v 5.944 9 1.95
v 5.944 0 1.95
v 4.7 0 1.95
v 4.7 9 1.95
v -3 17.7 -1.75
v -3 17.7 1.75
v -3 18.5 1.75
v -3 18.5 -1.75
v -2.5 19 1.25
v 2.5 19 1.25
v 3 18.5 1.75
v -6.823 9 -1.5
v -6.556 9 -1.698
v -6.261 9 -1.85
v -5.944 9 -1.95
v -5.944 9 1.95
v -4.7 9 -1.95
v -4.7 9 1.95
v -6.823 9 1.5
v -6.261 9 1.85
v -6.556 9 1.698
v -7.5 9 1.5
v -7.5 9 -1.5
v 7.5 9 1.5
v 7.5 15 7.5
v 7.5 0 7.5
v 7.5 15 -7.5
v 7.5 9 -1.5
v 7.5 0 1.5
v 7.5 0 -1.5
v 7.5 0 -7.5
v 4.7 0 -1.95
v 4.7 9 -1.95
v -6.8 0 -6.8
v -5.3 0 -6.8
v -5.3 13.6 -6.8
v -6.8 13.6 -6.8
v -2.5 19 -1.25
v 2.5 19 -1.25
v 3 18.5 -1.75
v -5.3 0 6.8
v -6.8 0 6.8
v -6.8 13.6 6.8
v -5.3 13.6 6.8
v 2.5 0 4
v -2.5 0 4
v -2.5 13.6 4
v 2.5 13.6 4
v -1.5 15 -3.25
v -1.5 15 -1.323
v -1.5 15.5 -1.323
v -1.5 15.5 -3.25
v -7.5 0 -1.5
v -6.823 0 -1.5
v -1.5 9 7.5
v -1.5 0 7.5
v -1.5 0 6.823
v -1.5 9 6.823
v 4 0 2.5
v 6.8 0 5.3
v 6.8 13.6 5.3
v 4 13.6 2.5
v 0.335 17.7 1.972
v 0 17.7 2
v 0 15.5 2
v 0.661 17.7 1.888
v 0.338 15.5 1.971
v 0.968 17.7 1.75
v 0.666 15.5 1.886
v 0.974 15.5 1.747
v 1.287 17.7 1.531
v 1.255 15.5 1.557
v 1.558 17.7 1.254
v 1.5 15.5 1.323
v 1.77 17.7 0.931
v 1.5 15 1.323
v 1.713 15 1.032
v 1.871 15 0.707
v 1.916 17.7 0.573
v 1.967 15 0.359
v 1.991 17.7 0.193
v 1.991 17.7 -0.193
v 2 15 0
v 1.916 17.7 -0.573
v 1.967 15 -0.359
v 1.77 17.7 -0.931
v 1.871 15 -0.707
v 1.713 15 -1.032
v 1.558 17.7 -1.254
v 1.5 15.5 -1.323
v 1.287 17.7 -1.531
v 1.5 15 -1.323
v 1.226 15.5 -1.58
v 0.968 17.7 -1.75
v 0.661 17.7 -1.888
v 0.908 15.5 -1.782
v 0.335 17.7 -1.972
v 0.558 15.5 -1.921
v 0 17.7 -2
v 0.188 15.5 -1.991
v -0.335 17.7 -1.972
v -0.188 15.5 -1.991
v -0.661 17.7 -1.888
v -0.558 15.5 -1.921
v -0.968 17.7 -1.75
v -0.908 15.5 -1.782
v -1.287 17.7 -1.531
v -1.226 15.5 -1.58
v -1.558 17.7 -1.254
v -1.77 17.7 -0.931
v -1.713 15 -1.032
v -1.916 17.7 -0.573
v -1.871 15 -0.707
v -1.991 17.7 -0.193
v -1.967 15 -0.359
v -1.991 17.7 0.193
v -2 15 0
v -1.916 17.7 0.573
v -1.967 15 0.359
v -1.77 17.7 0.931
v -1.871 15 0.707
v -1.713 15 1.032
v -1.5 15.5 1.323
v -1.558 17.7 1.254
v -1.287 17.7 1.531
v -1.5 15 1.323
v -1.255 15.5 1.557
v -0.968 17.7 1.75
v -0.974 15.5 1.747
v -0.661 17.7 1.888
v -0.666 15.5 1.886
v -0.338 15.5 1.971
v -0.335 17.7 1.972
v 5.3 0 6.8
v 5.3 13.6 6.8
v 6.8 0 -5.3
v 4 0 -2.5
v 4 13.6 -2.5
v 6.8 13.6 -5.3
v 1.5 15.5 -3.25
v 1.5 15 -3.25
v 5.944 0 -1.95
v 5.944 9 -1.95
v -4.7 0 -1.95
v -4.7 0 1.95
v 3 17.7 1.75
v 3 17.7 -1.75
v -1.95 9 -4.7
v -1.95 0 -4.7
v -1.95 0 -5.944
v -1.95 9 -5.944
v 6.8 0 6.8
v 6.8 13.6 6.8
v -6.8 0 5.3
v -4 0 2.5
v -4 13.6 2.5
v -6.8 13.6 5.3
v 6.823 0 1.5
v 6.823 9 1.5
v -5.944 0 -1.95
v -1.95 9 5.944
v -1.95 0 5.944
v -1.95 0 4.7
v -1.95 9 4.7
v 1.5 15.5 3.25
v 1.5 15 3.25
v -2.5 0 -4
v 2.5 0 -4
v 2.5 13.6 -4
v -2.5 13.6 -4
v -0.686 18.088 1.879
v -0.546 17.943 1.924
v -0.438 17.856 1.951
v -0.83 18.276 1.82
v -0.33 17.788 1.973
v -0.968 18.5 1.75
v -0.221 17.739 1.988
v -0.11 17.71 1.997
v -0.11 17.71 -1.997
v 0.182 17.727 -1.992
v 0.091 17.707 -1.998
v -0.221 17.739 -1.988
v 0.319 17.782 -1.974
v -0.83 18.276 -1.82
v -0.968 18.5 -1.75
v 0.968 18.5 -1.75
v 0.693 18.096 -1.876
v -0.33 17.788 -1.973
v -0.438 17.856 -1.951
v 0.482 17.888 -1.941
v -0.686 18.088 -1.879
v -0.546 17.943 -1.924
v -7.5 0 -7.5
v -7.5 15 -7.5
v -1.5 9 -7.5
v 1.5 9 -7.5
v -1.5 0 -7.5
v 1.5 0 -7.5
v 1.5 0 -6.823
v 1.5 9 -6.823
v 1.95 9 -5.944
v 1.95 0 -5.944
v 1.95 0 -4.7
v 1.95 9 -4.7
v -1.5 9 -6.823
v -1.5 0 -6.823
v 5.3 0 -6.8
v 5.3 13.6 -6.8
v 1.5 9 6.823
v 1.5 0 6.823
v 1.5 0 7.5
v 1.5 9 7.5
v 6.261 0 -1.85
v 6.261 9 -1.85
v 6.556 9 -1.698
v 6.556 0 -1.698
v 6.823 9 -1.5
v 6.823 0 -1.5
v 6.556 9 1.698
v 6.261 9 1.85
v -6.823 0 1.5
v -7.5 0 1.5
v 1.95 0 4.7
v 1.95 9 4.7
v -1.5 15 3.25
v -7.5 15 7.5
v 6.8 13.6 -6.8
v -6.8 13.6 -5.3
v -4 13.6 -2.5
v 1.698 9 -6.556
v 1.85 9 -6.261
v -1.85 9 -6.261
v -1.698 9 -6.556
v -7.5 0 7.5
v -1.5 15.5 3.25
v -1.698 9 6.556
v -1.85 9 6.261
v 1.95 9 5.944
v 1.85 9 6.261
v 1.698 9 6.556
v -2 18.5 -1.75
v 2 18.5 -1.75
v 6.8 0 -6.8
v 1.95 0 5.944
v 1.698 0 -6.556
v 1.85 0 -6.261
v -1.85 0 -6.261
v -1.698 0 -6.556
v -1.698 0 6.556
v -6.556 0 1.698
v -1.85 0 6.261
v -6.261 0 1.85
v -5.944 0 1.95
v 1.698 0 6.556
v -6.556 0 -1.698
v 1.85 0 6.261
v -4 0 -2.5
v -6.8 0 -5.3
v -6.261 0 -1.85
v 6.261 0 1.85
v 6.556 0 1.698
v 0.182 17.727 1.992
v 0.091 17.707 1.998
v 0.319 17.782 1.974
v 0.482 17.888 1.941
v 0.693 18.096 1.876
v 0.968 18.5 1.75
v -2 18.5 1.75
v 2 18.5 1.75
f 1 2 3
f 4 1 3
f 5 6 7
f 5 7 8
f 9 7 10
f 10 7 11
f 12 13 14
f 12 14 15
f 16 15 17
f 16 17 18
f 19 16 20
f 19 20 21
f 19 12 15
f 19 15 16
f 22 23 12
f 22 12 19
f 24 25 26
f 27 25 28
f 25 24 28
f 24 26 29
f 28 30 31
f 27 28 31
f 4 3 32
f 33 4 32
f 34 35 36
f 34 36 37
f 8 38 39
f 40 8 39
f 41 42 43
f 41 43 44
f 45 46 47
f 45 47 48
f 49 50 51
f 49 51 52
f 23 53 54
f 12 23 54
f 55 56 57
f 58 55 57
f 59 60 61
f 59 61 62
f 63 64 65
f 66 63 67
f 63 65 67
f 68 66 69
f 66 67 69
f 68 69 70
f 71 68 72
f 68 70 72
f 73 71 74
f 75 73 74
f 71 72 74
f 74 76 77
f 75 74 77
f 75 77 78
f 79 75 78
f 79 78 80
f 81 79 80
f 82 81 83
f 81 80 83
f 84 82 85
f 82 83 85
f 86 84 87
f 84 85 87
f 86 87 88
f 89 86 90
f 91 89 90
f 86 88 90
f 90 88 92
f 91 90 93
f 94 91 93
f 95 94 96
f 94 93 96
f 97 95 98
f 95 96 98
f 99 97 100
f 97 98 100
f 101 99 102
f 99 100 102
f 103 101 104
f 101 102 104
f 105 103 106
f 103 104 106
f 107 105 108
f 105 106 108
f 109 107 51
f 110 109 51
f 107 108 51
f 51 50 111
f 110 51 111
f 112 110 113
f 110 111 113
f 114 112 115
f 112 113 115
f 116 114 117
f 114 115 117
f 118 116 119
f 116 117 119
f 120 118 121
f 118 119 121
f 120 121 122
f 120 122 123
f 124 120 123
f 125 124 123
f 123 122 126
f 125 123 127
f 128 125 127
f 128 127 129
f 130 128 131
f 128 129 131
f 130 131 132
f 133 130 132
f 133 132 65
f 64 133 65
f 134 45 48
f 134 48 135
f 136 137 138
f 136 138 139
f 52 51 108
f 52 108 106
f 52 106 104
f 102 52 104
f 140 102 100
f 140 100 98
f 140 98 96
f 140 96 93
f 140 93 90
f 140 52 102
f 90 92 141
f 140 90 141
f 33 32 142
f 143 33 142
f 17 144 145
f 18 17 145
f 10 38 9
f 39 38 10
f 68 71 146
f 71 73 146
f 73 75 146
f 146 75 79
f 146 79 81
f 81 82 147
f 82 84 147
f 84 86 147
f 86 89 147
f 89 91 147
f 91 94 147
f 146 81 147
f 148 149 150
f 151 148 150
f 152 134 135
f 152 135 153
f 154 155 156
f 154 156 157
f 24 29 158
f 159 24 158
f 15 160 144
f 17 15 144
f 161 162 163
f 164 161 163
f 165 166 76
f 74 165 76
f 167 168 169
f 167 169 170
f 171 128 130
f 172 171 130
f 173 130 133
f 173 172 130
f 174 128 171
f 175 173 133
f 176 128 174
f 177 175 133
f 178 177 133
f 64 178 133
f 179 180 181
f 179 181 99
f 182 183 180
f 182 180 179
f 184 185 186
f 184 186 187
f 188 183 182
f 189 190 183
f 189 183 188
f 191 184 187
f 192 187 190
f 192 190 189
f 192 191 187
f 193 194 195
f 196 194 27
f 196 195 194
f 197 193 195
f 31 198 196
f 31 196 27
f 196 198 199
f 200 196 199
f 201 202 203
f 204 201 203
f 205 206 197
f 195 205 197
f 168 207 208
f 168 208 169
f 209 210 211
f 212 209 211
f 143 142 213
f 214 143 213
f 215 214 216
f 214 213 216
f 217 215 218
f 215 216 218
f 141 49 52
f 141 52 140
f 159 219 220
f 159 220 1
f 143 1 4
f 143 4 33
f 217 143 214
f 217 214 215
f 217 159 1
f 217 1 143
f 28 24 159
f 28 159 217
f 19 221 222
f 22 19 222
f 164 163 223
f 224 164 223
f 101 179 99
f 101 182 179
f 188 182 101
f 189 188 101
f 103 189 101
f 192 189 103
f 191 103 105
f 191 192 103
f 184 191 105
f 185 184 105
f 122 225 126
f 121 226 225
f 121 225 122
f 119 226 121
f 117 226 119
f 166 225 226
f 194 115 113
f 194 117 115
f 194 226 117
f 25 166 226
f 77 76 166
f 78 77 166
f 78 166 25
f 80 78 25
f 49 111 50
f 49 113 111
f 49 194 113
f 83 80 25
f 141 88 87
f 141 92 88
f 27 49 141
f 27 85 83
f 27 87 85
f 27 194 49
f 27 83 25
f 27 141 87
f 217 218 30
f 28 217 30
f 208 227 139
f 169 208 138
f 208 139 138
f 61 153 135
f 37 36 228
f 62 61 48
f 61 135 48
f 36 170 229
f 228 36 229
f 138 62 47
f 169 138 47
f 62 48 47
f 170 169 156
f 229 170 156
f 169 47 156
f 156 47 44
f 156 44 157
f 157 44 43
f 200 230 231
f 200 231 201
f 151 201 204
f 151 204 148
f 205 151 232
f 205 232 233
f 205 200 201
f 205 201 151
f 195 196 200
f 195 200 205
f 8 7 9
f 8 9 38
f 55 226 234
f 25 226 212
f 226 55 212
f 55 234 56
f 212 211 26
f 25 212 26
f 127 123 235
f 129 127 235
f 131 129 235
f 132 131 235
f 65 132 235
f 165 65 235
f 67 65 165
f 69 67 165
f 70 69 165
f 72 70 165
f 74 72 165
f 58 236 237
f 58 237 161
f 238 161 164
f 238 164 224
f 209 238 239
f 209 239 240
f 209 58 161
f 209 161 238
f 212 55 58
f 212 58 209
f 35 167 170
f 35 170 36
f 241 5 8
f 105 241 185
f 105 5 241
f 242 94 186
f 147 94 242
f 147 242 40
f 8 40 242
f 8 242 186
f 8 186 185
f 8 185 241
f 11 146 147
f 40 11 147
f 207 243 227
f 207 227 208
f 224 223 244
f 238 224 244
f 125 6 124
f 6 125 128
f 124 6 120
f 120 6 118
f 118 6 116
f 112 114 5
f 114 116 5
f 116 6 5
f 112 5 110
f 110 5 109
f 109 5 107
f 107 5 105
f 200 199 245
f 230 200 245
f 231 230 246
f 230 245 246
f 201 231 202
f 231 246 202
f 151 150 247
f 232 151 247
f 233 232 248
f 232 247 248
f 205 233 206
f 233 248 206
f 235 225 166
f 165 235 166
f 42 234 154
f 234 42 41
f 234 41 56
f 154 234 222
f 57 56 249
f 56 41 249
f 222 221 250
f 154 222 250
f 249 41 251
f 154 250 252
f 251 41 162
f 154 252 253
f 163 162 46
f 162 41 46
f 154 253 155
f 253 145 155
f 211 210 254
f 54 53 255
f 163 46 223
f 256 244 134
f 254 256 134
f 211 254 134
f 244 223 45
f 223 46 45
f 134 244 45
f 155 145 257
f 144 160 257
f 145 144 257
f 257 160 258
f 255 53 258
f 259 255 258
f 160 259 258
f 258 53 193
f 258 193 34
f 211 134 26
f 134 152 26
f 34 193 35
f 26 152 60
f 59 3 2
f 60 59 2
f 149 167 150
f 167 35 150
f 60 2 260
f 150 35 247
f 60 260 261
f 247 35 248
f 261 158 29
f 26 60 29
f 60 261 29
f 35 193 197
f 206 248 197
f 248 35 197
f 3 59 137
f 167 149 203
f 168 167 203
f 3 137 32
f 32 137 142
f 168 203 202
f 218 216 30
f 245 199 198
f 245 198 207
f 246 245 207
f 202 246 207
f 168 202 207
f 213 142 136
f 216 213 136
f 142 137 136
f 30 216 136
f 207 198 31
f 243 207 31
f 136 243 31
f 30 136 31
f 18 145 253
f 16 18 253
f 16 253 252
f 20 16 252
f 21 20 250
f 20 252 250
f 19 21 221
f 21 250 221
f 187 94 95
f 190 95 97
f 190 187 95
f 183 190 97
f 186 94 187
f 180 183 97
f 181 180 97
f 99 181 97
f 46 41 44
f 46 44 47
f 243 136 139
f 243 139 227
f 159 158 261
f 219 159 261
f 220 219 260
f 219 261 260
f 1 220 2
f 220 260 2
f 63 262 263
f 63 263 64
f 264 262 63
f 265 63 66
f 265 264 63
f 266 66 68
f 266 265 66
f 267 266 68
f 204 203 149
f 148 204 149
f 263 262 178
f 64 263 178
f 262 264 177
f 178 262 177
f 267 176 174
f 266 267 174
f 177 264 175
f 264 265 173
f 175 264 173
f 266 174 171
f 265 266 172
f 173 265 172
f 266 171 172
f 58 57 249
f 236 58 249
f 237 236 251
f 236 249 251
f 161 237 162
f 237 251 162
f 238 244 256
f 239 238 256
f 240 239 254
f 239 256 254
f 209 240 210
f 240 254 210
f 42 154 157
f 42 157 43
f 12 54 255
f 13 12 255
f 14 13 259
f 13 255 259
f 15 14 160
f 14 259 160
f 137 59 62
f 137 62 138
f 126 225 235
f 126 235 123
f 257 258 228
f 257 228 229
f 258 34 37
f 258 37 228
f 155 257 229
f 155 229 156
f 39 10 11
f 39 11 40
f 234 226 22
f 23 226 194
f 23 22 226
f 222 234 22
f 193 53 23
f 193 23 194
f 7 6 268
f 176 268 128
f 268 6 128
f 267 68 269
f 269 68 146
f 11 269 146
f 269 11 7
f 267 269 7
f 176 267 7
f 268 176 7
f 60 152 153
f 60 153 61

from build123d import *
from build123d.topology import SkipClean

# Parameters (mm, degrees)
SKETCH_1_W               = 15
SKETCH_1_H               = 15
EXTRUDE_1_DEPTH          = 15
CUT_EXTRUDE_1_DEPTH      = 9
SKETCH_4_W               = 3
SKETCH_4_H               = 6.5
EXTRUDE_2_DEPTH          = 0.5
EXTRUDE_3_DEPTH          = 2.2
EXTRUDE_3_DEPTH_BACK     = 0.5
SKETCH_6_R               = 2
SKETCH_7_W               = 6
SKETCH_7_H               = 3.5
EXTRUDE_4_DEPTH          = 1.3
EXTRUDE_START            = 0.8
SKETCH_8_R               = 2
EXTRUDE_5_DEPTH          = 0.8
CHAMFER_1_SIZE           = 0.5
CUT_EXTRUDE_2_DEPTH      = 2
CUT_EXTRUDE_2_DEPTH_BACK = 2
PATTERN_CIRCULAR_1_COUNT = 4
CUT_EXTRUDE_3_DEPTH      = 13.6


with BuildPart() as part:
    # 草图1 → 凸台-拉伸1 (new body)
    with BuildSketch(Plane(origin=(0, 0, 0), x_dir=(1, 0, 0), z_dir=(0, 1, 0))):
        Rectangle(SKETCH_1_W, SKETCH_1_H)
    extrude(amount=EXTRUDE_1_DEPTH)

    # 草图2 → 切除-拉伸1 (cut)
    with BuildSketch(Plane.XZ):
        with BuildLine():
            Line((1.5, 7.5), (-1.5, 7.5))
            Line((-1.5, 7.5), (-1.5, 6.822875656))
            ThreePointArc((-1.5, 6.822875656), (-1.780042303, 6.411838473), (-1.95, 5.944409721))
            Line((-1.95, 5.944409721), (-1.95, 4.7))
            Line((-1.95, 4.7), (1.95, 4.7))
            Line((1.95, 4.7), (1.95, 5.944409721))
            ThreePointArc((1.95, 5.944409721), (1.780042303, 6.411838473), (1.5, 6.822875656))
            Line((1.5, 6.822875656), (1.5, 7.5))
        make_face()
    cut_extrude_1 = extrude(amount=-CUT_EXTRUDE_1_DEPTH, mode=Mode.SUBTRACT)

    # 草图4 → 凸台-拉伸2 (add)
    with BuildSketch(Plane(origin=(0, 15, 0), x_dir=(1, 0, 0), z_dir=(0, 1, 0))):
        Rectangle(SKETCH_4_W, SKETCH_4_H)
    extrude(amount=EXTRUDE_2_DEPTH)

    # 草图6 → 凸台-拉伸3 (add, two sides: drawn at the far end of the back side and taken through both)
    with BuildSketch(Plane(origin=(0, 15.5, 0), x_dir=(1, 0, 0), z_dir=(0, 1, 0)).offset(-EXTRUDE_3_DEPTH_BACK)):
        with Locations(Location((0, 0, 0), (0, 0, 270))):
            Circle(SKETCH_6_R)
    extrude(amount=EXTRUDE_3_DEPTH + EXTRUDE_3_DEPTH_BACK)

    # 草图7 → 凸台-拉伸4 (add)
    with BuildSketch(Plane(origin=(0, 17.7, 0), x_dir=(1, 0, 0), z_dir=(0, 1, 0))):
        Rectangle(SKETCH_7_W, SKETCH_7_H)
    extrude(amount=EXTRUDE_4_DEPTH)

    # 草图8 → 凸台-拉伸5 (add)
    with SkipClean():  # the faces are left unmerged after this step: merging them gives an invalid solid
        with BuildSketch(Plane(origin=(0, 17.7, 0), x_dir=(1, 0, 0), z_dir=(0, 1, 0)).offset(EXTRUDE_START)):
            with Locations(Location((0, 0, 0), (0, 0, 298.955024372))):
                Circle(SKETCH_8_R)
        extrude(amount=-EXTRUDE_5_DEPTH)
    add(part.part.scale(1), mode=Mode.REPLACE)  # the faces are merged on a copy

    # 倒角1
    chamfer_1_edges = [part.edges().sort_by_distance(p)[0] for p in [
        (0, 19, -1.75),
        (-3, 19, 0),
        (0, 19, 1.75),
        (3, 19, 0),
    ]]
    chamfer(chamfer_1_edges, length=CHAMFER_1_SIZE - 0.0001)  # a hair under: the kernel refuses the full size

    # 草图9 → 切除-拉伸2 (cut, two sides: drawn at the far end of the back side and taken through both)
    with BuildSketch(Plane(origin=(0, 0, 0), x_dir=(0, 0, -1), z_dir=(1, 0, 0)).offset(-CUT_EXTRUDE_2_DEPTH_BACK)):
        Polygon((-2, 17.7), (-2, 18.5), (-1.75, 18.5), align=None)
        Polygon((1.75, 18.5), (2, 17.7), (2, 18.5), align=None)
    extrude(amount=CUT_EXTRUDE_2_DEPTH + CUT_EXTRUDE_2_DEPTH_BACK, mode=Mode.SUBTRACT)

    # 阵列(圆周)1: 切除-拉伸1 ×4 about axis
    pattern_circular_1_axis = Axis((0, 0, 0), (0, 1, 0))
    for i in range(1, PATTERN_CIRCULAR_1_COUNT):
        add(cut_extrude_1.rotate(pattern_circular_1_axis, i * 360 / PATTERN_CIRCULAR_1_COUNT), mode=Mode.SUBTRACT)

    # 草图10 → 切除-拉伸3 (cut)
    with BuildSketch(Plane.XZ):
        Polygon((6.8, 6.8), (6.8, 5.3), (4, 2.5), (4, -2.5), (6.8, -5.3), (6.8, -6.8), (5.3, -6.8), (2.5, -4), (-2.5, -4), (-5.3, -6.8), (-6.8, -6.8), (-6.8, -5.3), (-4, -2.5), (-4, 2.5), (-6.8, 5.3), (-6.8, 6.8), (-5.3, 6.8), (-2.5, 4), (2.5, 4), (5.3, 6.8), align=None)
    extrude(amount=-CUT_EXTRUDE_3_DEPTH, mode=Mode.SUBTRACT)


solid = part.part
